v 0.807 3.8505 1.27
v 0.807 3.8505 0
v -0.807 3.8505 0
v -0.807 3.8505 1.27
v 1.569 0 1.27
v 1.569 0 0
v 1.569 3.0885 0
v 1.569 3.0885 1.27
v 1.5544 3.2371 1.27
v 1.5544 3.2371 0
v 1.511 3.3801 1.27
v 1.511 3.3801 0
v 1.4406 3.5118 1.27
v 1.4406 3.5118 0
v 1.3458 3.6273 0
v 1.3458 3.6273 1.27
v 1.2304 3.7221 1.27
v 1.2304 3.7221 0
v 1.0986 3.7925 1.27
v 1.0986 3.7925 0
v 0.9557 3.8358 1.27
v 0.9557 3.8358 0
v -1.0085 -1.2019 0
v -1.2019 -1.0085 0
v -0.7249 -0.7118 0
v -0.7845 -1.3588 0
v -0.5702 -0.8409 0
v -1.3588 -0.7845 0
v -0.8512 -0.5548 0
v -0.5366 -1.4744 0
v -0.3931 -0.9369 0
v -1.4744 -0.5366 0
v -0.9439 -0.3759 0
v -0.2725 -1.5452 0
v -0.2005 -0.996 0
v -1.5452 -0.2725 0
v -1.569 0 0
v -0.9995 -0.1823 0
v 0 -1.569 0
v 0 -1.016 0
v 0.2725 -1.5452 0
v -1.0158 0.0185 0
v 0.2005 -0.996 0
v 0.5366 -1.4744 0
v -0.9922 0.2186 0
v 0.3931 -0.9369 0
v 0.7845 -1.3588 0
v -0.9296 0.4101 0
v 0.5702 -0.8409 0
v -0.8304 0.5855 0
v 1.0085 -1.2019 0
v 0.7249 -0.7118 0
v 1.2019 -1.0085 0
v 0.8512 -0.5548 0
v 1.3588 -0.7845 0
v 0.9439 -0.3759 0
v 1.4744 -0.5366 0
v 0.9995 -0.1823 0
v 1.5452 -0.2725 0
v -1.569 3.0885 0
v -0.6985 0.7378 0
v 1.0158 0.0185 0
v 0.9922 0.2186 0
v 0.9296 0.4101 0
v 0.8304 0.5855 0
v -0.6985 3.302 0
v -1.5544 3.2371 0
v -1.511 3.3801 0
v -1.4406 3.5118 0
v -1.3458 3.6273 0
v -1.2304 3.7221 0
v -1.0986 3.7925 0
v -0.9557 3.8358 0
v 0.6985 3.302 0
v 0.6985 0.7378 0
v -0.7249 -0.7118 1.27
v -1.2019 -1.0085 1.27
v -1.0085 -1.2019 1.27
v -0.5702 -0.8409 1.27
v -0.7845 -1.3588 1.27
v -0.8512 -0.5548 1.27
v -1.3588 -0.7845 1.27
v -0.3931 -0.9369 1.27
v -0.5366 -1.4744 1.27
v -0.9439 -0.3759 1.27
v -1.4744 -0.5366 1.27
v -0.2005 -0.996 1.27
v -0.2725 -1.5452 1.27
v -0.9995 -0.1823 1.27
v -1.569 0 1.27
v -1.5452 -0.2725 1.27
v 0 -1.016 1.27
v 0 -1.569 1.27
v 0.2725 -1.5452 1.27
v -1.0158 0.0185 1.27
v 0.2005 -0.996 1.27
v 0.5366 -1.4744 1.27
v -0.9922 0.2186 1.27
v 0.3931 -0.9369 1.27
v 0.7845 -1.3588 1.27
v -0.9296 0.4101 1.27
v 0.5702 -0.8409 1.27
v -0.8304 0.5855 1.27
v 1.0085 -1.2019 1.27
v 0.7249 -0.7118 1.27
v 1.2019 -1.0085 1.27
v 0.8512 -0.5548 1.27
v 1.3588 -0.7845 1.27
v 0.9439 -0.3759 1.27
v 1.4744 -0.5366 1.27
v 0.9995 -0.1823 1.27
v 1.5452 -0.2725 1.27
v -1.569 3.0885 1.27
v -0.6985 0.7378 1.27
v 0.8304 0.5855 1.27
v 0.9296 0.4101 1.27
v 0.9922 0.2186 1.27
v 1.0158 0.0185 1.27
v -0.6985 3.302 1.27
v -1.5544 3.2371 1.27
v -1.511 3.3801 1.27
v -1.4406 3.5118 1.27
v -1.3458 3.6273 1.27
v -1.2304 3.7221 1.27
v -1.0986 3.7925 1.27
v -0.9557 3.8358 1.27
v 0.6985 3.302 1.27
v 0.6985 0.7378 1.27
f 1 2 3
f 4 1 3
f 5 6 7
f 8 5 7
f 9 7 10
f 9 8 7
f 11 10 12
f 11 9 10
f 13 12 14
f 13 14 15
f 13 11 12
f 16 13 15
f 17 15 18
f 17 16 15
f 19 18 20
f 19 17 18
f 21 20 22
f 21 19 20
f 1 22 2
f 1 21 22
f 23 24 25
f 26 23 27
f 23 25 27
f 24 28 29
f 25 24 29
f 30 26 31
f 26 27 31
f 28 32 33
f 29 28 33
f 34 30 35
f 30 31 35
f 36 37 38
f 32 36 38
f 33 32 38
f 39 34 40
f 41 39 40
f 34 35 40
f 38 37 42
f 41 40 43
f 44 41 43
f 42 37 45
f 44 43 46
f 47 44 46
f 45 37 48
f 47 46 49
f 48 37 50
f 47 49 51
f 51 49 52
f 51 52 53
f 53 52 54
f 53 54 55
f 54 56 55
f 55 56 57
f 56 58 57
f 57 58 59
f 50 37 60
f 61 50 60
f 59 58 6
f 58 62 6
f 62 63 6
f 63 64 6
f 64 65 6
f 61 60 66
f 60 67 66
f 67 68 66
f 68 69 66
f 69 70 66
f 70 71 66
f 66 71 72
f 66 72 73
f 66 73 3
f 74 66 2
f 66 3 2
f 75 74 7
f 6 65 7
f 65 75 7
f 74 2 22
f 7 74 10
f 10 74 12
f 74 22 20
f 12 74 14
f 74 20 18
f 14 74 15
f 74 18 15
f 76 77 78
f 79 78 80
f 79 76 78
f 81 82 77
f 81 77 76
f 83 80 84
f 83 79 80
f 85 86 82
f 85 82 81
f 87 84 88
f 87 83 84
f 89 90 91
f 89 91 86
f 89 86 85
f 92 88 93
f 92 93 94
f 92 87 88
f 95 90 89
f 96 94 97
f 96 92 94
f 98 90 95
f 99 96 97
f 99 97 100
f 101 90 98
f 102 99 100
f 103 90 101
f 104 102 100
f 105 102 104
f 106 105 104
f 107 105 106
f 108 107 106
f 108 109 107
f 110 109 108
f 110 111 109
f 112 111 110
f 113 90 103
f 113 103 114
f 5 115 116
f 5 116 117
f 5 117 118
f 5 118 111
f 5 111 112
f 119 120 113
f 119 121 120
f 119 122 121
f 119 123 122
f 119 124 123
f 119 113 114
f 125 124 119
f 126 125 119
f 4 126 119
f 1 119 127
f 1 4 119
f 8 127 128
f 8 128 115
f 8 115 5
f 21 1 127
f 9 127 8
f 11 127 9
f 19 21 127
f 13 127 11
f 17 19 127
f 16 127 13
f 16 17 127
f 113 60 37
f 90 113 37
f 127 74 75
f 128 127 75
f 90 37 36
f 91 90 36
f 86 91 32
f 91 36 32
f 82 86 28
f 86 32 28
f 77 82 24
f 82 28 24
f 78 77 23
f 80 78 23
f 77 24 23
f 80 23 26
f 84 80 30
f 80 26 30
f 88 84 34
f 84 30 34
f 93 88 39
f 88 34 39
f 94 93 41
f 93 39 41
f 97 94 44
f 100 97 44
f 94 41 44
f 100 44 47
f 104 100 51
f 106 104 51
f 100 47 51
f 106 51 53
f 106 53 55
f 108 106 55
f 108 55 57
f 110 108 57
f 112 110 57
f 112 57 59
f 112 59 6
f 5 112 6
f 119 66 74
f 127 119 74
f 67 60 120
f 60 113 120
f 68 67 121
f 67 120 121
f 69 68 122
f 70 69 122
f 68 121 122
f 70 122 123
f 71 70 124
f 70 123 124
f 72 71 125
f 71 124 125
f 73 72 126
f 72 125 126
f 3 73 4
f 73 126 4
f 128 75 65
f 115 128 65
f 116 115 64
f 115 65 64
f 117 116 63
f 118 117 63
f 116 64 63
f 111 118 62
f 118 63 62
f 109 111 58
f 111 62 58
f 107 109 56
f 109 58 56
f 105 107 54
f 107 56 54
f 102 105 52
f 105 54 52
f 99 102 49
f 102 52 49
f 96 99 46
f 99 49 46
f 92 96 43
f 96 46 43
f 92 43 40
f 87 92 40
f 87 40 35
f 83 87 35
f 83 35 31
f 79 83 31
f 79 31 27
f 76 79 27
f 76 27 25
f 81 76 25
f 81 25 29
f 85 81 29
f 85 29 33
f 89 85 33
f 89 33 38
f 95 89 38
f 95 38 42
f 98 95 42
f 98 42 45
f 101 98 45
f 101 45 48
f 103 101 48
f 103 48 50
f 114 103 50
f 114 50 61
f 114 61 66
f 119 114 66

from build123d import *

# Parameters (mm, degrees)
BOSS_EXTRUDE1_DEPTH = 1.27
SKETCH2_R           = 1.016
CUT_EXTRUDE1_DEPTH  = 2.54
FILLET2_R           = 0.762


with BuildPart() as part:
    # Sketch1 → Boss-Extrude1 (new body)
    with BuildSketch(Plane.XY):
        with BuildLine():
            Line((-0.6985, 1.404959328), (-0.6985, 3.302))
            Line((-0.6985, 3.302), (0.6985, 3.302))
            Line((0.6985, 3.302), (0.6985, 1.404959328))
            ThreePointArc((0.6985, 1.404959328), (1.33374867, 0.826394245), (1.569016559, 0))
            Line((1.569016559, 0), (1.569016559, 3.850479464))
            Line((1.569016559, 3.850479464), (-1.569016559, 3.850479464))
            Line((-1.569016559, 3.850479464), (-1.569016559, 0))
            ThreePointArc((-1.569016559, 0), (-1.33374867, 0.826394245), (-0.6985, 1.404959328))
        make_face()
        with BuildLine():
            ThreePointArc((0.6985, 0), (0, -0.6985), (-0.6985, 0))
            Line((-0.6985, 0), (-1.569016559, 0))
            ThreePointArc((-1.569016559, 0), (0, -1.569016559), (1.569016559, 0))
            Line((1.569016559, 0), (0.6985, 0))
        make_face()
        with BuildLine():
            ThreePointArc((1.569016559, 0), (1.33374867, 0.826394245), (0.6985, 1.404959328))
            Line((0.6985, 1.404959328), (0.6985, 0))
            Line((0.6985, 0), (1.569016559, 0))
        make_face()
        with BuildLine():
            Line((-0.6985, 0), (-0.6985, 1.404959328))
            ThreePointArc((-0.6985, 1.404959328), (-1.33374867, 0.826394245), (-1.569016559, 0))
            Line((-1.569016559, 0), (-0.6985, 0))
        make_face()
    extrude(amount=BOSS_EXTRUDE1_DEPTH)

    # Sketch2 → Cut-Extrude1 (cut)
    with BuildSketch(Plane(origin=(0, 0, 0), x_dir=(-1, 0, 0), z_dir=(0, 0, -1))):
        Circle(SKETCH2_R)
    extrude(amount=-CUT_EXTRUDE1_DEPTH, mode=Mode.SUBTRACT)

    # Fillet2
    fillet2_edges = [part.edges().sort_by_distance(p)[0] for p in [
        (-1.569016559, 3.850479464, 0.635),
        (1.569016559, 3.850479464, 0.635),
    ]]
    fillet(fillet2_edges, radius=FILLET2_R)


solid = part.part
